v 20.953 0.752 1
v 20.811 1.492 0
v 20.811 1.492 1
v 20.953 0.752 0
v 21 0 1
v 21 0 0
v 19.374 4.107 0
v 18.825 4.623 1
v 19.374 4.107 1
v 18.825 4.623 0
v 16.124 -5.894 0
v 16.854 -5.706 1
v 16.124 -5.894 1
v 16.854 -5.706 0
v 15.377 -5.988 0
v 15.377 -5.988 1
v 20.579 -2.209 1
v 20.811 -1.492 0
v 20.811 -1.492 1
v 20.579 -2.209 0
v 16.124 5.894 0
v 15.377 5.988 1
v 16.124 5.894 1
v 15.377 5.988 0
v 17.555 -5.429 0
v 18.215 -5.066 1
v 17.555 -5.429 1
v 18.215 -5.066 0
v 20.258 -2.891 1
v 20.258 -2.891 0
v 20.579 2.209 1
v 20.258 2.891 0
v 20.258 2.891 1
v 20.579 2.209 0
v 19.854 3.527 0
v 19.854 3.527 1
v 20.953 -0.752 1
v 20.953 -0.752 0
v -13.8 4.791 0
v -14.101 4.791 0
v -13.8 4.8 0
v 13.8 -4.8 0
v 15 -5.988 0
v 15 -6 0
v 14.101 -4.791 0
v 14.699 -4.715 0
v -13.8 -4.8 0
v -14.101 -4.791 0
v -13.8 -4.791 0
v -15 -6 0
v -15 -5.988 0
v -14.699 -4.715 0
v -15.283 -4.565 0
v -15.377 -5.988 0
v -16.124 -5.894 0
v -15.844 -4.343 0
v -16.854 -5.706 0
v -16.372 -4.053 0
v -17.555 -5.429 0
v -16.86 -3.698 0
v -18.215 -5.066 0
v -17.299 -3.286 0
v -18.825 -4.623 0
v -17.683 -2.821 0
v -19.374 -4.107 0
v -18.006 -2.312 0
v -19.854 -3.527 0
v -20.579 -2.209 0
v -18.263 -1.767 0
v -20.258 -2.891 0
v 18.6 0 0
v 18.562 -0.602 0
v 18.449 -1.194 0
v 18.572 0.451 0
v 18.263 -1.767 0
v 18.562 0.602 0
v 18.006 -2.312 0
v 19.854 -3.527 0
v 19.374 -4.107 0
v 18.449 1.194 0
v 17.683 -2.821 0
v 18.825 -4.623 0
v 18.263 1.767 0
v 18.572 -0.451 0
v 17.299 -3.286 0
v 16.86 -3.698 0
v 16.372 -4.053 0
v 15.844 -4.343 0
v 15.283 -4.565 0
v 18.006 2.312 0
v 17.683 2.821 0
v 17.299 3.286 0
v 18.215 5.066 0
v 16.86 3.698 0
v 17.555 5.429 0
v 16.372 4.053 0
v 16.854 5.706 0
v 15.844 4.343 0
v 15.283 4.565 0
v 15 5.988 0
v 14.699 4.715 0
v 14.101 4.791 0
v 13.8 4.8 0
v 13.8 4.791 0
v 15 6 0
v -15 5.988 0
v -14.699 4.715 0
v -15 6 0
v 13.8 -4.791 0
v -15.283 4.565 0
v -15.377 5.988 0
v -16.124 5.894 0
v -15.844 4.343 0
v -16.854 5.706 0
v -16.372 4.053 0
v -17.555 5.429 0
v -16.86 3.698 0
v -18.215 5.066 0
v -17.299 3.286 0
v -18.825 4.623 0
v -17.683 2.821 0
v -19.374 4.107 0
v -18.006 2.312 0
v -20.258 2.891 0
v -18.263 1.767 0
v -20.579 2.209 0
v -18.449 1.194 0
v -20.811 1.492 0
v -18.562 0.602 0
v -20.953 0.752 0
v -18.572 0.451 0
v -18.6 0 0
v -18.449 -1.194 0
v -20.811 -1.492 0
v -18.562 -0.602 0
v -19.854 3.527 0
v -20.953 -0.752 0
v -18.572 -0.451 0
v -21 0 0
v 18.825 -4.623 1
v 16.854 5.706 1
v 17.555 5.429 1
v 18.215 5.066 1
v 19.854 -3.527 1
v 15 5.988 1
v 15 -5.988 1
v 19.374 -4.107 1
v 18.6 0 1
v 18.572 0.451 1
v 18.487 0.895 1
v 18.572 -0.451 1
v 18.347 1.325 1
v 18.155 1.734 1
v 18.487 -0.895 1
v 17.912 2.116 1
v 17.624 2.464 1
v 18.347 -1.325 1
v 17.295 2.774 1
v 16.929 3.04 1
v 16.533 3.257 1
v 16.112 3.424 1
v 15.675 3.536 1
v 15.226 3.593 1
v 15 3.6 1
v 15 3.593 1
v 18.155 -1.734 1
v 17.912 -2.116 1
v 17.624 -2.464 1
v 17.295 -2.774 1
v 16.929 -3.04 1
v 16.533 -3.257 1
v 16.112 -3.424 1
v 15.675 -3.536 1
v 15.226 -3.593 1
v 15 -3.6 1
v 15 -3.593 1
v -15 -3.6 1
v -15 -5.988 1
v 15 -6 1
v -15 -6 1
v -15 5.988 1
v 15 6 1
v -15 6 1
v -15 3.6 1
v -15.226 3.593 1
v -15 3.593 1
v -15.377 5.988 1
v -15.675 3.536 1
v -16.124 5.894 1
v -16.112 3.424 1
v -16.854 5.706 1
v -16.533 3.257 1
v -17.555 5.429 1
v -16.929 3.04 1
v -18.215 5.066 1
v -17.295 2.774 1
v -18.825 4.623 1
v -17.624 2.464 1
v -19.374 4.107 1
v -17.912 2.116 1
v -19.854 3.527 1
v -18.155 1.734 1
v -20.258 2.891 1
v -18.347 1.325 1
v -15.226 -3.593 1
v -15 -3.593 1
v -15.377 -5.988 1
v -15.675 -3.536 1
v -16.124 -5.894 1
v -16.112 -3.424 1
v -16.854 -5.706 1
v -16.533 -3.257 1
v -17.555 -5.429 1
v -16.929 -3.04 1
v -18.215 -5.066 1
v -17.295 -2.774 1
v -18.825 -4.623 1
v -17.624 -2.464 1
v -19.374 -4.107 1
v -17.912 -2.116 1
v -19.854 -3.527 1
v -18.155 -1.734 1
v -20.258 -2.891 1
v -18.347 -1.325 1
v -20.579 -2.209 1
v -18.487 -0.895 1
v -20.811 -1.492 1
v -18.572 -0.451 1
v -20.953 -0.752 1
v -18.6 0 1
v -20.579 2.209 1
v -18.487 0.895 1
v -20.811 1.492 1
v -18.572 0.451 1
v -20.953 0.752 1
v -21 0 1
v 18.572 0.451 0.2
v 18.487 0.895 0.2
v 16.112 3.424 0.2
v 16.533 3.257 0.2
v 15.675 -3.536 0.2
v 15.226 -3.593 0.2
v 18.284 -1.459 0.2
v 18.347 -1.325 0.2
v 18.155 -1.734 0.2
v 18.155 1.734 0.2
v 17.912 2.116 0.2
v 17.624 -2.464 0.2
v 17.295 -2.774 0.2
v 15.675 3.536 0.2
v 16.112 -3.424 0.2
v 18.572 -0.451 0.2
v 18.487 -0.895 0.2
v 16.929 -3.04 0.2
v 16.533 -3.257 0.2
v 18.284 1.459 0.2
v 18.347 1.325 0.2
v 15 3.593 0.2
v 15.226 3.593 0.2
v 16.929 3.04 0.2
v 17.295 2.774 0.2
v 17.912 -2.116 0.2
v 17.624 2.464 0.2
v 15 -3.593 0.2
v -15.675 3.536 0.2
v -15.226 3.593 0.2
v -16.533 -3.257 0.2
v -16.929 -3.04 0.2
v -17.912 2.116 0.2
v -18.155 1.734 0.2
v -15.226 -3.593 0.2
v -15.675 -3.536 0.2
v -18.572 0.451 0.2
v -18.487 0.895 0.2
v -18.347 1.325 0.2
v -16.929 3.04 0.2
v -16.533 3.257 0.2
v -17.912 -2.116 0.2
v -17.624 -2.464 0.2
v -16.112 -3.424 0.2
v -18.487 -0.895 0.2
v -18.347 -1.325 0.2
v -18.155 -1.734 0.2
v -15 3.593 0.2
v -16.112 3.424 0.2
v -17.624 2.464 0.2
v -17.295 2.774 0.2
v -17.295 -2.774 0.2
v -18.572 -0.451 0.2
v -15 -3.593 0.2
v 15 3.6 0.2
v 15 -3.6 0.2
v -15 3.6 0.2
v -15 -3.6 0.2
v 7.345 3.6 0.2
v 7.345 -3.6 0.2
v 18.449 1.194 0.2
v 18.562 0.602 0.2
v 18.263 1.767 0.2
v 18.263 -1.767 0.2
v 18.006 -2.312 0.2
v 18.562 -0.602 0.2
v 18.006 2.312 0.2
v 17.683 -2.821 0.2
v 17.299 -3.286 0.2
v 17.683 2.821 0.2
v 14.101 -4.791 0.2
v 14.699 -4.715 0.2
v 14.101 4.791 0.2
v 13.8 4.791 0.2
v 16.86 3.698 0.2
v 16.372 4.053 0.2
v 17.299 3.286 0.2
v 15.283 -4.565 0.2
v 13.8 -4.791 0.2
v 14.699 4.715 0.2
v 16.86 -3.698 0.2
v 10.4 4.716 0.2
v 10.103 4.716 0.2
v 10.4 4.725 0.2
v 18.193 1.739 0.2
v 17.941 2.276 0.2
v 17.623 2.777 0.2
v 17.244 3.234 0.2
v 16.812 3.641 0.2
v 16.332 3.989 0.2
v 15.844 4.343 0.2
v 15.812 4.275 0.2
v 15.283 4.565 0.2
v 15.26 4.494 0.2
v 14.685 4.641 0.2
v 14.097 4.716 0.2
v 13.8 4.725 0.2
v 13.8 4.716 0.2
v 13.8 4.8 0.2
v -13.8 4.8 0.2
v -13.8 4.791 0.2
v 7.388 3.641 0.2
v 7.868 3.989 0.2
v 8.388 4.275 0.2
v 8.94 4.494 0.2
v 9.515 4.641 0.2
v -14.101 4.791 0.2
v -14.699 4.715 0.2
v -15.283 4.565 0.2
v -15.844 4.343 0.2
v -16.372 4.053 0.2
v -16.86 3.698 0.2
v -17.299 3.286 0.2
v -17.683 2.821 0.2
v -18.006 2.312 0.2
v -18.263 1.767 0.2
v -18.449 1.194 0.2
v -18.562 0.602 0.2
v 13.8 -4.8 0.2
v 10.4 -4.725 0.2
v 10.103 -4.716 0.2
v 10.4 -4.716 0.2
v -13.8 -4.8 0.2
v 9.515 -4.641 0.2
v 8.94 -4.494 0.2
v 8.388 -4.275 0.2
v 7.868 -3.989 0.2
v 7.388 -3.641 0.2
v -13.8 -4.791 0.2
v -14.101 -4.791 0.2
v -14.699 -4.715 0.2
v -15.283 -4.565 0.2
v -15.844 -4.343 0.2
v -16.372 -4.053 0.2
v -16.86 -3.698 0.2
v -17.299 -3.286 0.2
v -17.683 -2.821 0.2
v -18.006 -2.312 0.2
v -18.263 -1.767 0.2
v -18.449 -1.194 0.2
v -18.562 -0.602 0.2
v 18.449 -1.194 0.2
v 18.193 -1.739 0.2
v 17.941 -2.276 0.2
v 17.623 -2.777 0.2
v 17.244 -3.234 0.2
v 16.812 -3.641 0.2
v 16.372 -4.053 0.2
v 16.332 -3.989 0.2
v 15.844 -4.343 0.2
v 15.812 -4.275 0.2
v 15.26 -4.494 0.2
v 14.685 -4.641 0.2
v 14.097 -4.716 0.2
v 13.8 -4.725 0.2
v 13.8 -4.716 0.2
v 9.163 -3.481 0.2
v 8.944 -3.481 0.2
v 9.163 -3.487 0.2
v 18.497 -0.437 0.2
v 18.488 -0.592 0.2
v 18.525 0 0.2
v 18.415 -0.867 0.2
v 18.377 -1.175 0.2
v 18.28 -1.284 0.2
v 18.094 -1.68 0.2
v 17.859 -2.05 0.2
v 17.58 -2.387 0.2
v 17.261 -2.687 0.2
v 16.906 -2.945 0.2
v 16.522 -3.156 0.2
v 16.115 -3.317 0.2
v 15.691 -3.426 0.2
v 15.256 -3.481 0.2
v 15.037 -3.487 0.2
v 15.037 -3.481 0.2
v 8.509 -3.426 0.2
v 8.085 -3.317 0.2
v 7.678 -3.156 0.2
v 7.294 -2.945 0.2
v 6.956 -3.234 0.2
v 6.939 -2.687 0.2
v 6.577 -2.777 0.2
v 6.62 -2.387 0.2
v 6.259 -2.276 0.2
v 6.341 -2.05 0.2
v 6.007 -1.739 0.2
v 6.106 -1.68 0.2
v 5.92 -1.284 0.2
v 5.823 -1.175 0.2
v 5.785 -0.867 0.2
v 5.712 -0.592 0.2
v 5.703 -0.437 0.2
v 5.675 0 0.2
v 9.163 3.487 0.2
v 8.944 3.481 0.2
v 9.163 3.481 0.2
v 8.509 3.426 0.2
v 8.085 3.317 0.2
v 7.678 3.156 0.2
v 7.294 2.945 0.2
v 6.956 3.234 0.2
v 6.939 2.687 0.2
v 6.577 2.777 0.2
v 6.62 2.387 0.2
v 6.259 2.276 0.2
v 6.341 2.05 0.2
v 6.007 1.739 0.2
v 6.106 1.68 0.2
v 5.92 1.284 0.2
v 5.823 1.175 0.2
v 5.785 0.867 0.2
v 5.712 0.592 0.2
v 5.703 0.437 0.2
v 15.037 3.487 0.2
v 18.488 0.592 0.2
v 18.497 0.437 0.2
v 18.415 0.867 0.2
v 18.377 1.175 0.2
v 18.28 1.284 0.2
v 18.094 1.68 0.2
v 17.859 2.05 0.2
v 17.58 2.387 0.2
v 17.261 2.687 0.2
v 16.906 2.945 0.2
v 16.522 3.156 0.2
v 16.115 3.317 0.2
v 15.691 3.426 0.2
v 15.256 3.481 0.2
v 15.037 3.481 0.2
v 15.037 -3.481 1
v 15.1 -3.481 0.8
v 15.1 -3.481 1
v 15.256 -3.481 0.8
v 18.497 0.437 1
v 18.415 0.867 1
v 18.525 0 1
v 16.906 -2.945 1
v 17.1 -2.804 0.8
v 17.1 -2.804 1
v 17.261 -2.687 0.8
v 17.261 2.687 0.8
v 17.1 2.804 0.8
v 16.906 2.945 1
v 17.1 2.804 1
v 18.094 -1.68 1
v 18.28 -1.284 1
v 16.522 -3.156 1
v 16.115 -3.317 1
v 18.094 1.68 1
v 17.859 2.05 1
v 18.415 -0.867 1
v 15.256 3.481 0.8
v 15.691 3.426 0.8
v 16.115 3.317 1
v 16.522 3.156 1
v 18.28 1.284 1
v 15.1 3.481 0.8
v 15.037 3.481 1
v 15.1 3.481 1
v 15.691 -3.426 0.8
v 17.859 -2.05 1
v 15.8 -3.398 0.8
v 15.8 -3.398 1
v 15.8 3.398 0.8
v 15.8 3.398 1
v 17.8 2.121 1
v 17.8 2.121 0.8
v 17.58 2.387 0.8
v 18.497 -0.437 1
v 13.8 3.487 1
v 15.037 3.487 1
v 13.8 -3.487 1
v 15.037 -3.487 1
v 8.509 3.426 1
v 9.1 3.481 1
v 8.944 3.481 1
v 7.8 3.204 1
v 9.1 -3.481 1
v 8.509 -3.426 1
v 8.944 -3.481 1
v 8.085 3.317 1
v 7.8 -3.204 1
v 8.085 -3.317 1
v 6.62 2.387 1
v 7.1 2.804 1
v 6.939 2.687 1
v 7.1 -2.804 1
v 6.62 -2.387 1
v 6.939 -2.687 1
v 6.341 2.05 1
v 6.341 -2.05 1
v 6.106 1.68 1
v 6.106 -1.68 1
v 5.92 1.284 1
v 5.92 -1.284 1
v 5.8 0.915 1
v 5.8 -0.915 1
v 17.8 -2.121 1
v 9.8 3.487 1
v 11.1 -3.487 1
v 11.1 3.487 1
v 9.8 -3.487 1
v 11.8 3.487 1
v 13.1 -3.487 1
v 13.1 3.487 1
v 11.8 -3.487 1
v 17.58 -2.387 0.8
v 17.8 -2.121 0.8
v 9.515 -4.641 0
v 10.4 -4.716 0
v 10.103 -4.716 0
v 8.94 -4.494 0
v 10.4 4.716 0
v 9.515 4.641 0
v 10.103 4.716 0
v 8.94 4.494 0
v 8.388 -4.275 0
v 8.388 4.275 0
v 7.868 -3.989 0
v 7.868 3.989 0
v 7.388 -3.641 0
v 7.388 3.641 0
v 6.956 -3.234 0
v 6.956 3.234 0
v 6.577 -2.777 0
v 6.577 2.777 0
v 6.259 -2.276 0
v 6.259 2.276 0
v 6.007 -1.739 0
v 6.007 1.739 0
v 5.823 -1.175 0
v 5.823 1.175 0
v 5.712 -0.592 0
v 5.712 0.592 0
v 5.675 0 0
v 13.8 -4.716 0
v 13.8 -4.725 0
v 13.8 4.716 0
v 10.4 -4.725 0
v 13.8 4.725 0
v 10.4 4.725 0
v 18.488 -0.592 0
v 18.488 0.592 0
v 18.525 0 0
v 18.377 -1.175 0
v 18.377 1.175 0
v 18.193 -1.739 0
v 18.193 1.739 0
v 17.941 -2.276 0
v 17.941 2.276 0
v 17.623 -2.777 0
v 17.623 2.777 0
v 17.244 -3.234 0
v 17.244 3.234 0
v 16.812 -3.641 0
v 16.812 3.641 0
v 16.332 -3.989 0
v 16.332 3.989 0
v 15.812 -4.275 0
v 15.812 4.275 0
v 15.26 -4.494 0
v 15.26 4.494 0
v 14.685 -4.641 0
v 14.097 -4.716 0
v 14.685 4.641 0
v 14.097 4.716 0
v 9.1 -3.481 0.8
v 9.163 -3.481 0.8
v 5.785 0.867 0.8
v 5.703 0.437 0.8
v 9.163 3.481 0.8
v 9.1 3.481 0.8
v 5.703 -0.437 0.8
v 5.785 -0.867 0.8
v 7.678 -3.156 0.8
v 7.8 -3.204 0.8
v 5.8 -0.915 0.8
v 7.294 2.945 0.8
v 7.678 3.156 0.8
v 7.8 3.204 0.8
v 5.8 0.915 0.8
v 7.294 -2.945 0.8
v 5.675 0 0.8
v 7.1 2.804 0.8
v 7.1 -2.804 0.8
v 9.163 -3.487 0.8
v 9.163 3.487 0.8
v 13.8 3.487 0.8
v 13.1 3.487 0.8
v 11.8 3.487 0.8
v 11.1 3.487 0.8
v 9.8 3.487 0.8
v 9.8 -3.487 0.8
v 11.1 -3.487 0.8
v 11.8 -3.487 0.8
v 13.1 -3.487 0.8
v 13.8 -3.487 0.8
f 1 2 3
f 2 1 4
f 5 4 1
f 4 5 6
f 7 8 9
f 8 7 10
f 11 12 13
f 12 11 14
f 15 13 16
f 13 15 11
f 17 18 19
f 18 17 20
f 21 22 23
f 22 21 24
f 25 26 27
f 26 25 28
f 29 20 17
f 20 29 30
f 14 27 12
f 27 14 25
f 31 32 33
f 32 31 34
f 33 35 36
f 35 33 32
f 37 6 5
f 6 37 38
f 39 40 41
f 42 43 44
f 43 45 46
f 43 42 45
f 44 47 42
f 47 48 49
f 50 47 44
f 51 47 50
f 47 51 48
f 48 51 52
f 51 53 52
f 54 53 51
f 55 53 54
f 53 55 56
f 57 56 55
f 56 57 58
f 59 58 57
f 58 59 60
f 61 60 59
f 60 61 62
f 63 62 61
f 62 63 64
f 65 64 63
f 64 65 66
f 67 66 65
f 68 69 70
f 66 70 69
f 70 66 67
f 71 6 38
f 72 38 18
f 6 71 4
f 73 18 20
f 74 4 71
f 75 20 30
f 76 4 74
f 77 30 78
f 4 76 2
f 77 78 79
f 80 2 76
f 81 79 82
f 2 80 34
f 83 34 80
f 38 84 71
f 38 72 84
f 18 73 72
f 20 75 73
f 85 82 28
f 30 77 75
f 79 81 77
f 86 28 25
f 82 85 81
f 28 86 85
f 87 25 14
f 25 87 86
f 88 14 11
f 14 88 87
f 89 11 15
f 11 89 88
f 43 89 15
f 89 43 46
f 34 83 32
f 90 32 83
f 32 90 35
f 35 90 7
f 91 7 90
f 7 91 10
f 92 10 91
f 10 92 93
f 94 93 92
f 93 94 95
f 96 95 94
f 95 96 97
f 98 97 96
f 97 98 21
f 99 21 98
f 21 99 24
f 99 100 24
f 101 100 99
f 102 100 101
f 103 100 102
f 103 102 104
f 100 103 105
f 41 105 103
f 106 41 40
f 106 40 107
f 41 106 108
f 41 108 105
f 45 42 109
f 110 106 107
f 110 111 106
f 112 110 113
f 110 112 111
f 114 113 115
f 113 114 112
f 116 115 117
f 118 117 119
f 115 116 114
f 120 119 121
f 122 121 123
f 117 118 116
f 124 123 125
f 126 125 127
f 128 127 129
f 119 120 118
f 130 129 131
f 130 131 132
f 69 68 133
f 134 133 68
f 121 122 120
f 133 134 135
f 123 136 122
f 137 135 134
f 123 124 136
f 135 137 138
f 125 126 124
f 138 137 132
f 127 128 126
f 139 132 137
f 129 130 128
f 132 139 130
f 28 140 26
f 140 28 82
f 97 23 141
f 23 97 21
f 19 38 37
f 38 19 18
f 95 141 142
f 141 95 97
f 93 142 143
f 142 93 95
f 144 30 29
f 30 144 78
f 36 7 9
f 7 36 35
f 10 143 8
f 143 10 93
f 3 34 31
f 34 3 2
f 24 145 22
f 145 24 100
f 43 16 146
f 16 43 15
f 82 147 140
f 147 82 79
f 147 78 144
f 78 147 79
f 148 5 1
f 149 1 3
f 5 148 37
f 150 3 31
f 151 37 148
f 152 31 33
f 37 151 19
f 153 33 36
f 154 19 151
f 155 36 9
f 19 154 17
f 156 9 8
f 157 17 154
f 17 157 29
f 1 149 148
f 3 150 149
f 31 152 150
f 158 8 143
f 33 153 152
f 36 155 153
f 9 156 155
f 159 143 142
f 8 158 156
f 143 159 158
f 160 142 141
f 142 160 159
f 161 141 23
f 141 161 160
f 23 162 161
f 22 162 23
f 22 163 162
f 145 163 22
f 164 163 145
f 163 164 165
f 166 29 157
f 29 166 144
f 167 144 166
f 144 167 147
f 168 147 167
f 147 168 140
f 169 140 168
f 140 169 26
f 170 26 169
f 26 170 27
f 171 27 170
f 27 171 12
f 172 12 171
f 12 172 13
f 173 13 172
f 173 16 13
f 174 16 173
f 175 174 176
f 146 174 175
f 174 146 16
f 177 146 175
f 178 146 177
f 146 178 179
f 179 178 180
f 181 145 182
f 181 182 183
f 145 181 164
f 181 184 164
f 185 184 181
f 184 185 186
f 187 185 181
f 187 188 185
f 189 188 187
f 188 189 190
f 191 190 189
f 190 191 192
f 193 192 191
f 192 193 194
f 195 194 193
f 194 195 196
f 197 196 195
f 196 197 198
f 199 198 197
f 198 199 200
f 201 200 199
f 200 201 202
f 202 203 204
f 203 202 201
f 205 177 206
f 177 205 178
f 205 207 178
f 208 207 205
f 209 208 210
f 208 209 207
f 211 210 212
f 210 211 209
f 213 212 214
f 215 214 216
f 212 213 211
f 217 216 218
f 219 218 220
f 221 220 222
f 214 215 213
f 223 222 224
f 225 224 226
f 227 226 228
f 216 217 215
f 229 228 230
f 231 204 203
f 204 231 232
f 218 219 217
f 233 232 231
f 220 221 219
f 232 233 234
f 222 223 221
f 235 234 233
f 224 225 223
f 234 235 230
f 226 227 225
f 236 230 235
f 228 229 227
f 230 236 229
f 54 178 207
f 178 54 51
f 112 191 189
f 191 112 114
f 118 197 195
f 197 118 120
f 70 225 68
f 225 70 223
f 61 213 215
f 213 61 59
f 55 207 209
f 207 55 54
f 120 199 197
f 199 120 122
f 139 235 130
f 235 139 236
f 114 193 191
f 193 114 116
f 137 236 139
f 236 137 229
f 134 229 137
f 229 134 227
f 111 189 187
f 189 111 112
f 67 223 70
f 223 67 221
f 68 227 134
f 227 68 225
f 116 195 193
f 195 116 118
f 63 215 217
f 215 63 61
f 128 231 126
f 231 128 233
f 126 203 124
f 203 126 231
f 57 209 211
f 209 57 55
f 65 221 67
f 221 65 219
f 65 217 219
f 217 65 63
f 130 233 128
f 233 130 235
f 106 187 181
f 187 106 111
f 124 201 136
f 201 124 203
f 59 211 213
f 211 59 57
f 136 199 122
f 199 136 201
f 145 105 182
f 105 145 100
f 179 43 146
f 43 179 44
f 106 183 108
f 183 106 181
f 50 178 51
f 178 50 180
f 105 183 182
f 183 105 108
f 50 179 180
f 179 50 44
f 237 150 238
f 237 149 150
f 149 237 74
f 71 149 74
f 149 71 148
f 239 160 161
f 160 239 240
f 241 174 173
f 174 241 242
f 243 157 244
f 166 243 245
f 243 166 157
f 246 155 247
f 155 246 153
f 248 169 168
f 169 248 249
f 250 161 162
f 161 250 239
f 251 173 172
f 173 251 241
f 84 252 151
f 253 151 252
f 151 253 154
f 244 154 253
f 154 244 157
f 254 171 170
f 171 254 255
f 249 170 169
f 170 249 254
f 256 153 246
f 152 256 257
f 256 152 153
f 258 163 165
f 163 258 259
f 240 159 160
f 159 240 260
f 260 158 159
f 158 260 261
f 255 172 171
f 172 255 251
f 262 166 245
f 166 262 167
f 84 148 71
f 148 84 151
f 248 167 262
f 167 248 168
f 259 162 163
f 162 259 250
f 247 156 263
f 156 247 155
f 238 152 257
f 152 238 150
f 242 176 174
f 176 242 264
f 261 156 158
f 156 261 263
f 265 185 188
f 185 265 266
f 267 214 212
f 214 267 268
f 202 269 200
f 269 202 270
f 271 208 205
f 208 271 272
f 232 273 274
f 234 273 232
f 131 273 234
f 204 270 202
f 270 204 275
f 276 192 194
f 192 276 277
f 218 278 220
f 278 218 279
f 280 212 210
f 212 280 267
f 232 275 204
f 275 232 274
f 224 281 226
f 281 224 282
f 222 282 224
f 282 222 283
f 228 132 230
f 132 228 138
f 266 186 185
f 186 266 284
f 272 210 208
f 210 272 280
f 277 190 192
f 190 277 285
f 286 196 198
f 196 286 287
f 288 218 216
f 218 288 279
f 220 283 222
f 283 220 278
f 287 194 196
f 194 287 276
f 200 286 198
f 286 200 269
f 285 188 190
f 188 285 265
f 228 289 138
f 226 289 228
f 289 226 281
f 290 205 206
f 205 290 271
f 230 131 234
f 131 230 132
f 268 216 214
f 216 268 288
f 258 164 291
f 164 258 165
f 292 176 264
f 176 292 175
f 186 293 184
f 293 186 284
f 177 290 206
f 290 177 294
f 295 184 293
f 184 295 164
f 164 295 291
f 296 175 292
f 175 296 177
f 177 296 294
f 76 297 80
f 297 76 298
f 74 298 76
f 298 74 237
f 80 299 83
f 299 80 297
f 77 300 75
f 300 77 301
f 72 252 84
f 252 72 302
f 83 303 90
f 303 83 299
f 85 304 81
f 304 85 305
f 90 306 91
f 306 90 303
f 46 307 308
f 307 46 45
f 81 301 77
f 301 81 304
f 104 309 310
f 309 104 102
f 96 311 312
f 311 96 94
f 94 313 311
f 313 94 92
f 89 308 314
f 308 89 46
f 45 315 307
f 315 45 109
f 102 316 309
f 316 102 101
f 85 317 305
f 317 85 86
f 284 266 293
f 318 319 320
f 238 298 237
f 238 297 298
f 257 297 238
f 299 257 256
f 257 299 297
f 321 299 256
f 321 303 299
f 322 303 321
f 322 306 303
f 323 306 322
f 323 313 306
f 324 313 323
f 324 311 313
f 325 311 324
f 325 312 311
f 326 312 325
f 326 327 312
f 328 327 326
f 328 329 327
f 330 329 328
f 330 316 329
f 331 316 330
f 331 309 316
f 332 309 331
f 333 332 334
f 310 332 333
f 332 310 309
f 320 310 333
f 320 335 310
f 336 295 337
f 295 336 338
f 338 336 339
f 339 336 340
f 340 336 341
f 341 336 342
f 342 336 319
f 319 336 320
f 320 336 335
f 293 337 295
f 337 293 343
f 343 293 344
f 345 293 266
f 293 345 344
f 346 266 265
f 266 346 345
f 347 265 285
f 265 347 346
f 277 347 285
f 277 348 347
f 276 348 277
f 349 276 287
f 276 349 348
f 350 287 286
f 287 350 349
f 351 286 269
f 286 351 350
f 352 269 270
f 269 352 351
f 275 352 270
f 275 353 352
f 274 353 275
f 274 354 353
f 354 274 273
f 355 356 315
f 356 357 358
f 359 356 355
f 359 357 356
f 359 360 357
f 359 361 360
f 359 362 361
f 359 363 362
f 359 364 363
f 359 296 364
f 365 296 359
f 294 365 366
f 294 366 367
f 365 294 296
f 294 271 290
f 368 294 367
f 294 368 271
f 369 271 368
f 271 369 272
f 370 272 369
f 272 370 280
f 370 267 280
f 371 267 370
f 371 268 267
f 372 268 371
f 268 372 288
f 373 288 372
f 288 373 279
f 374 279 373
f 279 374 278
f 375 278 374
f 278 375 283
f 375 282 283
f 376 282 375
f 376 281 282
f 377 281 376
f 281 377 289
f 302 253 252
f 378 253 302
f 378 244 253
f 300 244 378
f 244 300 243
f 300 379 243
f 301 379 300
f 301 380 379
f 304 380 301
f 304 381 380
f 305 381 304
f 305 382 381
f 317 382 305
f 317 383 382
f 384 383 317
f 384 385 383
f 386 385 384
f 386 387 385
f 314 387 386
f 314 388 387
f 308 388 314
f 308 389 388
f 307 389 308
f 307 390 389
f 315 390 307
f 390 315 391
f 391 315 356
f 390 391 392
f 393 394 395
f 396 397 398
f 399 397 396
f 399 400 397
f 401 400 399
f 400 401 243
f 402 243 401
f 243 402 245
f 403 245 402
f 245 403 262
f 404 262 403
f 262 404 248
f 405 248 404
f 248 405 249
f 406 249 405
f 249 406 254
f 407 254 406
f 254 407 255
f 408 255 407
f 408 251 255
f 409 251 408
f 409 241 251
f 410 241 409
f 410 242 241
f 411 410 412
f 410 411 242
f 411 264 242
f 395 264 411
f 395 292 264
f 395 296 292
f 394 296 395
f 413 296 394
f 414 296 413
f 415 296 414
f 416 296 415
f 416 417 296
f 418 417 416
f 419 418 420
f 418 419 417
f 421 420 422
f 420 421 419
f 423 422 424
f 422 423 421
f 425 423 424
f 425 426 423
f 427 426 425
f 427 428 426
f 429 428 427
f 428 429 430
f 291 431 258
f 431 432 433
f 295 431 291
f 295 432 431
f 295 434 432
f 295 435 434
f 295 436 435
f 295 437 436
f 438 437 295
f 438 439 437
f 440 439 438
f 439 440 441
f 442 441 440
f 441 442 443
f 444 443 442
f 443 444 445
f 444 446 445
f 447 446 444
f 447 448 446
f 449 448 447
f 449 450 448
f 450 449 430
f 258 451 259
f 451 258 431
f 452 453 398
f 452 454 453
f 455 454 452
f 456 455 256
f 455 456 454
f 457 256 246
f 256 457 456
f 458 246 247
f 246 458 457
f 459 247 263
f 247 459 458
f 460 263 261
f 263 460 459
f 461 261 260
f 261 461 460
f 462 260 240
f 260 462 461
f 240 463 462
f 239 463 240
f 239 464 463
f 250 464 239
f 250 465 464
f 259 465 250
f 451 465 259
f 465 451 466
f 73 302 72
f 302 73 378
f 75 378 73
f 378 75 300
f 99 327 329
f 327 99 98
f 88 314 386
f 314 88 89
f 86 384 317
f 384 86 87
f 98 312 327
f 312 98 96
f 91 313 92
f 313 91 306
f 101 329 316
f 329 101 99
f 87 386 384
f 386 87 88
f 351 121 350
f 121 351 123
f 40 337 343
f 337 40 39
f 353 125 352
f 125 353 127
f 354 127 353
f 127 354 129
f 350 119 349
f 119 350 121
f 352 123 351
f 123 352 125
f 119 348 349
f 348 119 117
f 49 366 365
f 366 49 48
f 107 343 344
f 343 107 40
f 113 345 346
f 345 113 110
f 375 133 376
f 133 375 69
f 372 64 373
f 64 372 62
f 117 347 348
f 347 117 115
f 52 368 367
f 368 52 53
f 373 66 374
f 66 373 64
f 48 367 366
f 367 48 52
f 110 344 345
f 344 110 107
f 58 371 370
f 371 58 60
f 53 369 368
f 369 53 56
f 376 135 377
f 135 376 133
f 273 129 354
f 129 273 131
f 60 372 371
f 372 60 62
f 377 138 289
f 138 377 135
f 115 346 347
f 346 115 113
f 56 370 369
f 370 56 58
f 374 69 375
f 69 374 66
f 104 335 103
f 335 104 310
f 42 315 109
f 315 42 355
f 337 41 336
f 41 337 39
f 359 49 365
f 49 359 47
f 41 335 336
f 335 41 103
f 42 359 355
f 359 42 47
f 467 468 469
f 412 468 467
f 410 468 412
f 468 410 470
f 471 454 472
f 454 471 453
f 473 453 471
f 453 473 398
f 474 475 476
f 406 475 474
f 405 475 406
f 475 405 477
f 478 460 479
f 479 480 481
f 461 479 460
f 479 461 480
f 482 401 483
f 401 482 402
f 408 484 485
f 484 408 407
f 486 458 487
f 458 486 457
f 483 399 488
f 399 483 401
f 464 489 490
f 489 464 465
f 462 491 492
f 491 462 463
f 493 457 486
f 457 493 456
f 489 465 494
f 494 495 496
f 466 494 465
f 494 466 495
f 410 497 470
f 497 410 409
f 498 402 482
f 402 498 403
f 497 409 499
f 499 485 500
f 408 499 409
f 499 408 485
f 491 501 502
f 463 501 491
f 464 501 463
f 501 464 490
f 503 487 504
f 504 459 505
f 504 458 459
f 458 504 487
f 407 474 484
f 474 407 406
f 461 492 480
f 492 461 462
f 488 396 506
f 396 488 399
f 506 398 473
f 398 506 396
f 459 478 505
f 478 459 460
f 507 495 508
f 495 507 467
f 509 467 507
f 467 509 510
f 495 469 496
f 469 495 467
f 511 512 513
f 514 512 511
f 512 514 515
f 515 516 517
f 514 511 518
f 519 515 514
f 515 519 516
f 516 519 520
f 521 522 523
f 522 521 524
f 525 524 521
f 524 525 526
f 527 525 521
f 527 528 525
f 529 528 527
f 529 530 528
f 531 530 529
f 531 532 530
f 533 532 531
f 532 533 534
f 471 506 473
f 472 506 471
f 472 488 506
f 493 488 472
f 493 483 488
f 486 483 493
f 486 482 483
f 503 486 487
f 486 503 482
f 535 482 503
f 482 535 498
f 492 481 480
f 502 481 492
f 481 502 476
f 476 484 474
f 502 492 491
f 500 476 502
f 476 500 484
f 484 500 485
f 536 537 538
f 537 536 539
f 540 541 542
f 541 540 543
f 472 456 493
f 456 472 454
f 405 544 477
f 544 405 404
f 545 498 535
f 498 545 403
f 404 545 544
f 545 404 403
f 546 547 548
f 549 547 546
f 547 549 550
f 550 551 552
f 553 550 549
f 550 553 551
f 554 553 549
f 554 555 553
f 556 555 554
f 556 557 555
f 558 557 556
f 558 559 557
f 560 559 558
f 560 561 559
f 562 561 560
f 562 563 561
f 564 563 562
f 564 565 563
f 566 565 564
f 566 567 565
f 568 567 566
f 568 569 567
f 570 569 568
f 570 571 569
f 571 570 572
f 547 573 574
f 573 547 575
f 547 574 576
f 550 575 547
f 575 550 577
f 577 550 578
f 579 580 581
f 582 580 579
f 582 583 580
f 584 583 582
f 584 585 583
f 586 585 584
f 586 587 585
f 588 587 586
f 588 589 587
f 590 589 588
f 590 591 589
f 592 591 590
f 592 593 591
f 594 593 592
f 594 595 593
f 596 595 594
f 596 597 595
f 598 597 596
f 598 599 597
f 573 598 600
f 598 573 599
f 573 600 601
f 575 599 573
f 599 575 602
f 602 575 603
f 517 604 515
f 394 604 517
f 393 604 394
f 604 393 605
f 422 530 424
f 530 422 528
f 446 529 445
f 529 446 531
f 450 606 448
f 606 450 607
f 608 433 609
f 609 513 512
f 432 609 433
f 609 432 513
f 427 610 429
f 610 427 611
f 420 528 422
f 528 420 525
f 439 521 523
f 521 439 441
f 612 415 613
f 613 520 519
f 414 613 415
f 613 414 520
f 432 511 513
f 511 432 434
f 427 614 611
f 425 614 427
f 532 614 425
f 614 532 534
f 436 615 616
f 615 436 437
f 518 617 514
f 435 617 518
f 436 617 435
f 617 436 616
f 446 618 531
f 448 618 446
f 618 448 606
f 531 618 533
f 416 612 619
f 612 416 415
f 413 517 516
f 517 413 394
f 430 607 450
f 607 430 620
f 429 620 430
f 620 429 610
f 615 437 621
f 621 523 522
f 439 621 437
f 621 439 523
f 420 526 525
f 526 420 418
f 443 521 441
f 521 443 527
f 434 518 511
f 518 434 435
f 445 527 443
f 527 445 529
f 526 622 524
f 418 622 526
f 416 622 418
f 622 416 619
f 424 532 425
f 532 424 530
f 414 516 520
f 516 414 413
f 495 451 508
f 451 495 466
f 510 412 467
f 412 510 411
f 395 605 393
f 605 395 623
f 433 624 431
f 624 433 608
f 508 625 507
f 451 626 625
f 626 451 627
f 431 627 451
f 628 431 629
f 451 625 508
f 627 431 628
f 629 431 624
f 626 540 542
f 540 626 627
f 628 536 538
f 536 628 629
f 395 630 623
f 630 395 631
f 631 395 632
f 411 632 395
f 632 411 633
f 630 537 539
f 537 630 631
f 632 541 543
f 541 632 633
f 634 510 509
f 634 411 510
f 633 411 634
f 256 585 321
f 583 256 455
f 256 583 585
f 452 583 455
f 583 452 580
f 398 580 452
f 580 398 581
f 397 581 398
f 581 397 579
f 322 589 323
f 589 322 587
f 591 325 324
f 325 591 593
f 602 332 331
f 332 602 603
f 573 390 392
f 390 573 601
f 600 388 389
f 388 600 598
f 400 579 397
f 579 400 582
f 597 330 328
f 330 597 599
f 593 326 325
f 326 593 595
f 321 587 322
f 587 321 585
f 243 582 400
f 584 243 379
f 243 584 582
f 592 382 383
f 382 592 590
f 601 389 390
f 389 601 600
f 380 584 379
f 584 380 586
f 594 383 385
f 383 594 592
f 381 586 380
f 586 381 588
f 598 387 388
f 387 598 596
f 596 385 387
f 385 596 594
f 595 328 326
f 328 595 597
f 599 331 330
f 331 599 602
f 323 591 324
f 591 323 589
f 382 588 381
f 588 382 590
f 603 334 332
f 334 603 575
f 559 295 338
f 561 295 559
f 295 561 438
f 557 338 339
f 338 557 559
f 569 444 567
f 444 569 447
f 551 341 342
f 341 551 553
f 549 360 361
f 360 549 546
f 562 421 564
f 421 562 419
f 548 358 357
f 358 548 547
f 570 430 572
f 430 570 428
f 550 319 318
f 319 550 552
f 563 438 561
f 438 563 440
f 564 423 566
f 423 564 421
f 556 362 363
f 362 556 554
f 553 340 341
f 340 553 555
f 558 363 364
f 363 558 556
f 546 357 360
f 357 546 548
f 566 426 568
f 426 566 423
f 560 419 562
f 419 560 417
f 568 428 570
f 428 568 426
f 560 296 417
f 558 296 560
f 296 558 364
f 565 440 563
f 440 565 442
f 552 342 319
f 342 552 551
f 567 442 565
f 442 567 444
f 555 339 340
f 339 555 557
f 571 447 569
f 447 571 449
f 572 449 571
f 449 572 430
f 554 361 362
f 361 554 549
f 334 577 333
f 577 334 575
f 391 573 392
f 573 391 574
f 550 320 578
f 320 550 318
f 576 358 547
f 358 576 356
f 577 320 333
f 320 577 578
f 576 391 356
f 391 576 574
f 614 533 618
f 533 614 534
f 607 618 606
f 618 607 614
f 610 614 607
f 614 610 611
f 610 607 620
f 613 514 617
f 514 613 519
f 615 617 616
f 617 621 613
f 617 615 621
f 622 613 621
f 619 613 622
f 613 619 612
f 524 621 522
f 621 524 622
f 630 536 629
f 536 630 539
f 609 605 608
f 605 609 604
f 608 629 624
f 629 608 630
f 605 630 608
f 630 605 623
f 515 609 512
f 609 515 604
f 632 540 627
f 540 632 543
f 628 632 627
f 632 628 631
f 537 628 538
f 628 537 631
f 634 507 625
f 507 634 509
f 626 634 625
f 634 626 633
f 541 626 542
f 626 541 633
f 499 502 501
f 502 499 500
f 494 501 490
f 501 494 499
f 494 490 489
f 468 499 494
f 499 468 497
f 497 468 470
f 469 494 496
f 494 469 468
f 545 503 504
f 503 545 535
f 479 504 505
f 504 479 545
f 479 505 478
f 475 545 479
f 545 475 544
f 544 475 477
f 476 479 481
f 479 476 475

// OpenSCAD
/* vim:ts=4:sw=4:sts=4:et:ai
 *
 * Webcam Cover generator v1.0
 * By: Kleinjoni aka. sneezegray
 *
 * - change the values like you want 
 * - render(F6)
 * - look if everything fits, maybe change values again 
 * - change print=true 
 * - export .stl file
 * 
 */
/////////// Settings /////////////
//////////////////////////////////
// print=true putts the parts in printable position 
print=false;
// the outer dimmensions
widht=42;
hight=12;
thickness=1;
// the border width
border=2.4; 
// the width of the webcam cover
camW=13; 
// Design Options
cubic=false;
// stripe widht( 0 if not wanted)
stripes=0.7; 
// how facet rich it should be
$fn=50; 
// spacing Options
// upper gap
gap1=0.15; 
// middel spacing Gap(mostly not necessary)
gap2=0; 
// under gap
gap3=0.15;
// The size difference of the overlapping parts (in Procent) .
under=20; 
//////////////////////////////////
//////////////////////////////////
diff=under/100;

echo("<b>overlapping downpart thickness:", thickness*diff ,"</b>");
echo("<b>overlapping uperpart thickness:", thickness-thickness*diff-gap2 ,"</b>");
echo("<b>webcam hight :", hight-border*2 ,"</b>");

module rcube(w,h,t,cu) {
    union() {
        if (cu==false) {
            w=w-h;
            translate([w/2,0,0]) {
                cylinder(t,h/2,h/2);
            }
            translate([-w/2,0,0]) {
                cylinder(t,h/2,h/2);
            }
            translate([-w/2,-h/2,0]) {
                cube([w,h,t]);
            }
        }
        if (cu==true) {
            translate([-w/2,-h/2,0]) {
                cube([w,h,t]);
            }
        }
    }
}
if (print==true) {
    translate([0,hight,thickness])
        rotate([180,0,0])
            oval();
} else if (print==false) {
    oval();
} else {
    echo("Something is absurd\n");
}

module oval() {
    difference() {
        rcube(widht,hight,thickness,cubic);
        union() {
            rcube(widht-border*2,hight-border*2,thickness,cubic);
            rcube(widht-border*2,hight-border,thickness*diff+gap2,cubic);
        }
    }
}

module linear_array(count, distance) {
    for (i = [1:1:count])  {
        translate([distance*i,0,0,]) 
        children();
    }
}

translate([widht/2-border-camW/2,0,0]) {
    difference() {
        union() {
            rcube(camW-gap1,hight-border*2-gap1*1.5,thickness,cubic);
            rcube(camW-gap3,hight-border-gap3,thickness*diff,cubic);
        }
        translate([-camW/2-(hight+border)/2+stripes,-hight/2,thickness*((diff-1)*-1)]) 
            linear_array(count=30, distance=2)
                cube([stripes,hight+border,1]);
    }
}
